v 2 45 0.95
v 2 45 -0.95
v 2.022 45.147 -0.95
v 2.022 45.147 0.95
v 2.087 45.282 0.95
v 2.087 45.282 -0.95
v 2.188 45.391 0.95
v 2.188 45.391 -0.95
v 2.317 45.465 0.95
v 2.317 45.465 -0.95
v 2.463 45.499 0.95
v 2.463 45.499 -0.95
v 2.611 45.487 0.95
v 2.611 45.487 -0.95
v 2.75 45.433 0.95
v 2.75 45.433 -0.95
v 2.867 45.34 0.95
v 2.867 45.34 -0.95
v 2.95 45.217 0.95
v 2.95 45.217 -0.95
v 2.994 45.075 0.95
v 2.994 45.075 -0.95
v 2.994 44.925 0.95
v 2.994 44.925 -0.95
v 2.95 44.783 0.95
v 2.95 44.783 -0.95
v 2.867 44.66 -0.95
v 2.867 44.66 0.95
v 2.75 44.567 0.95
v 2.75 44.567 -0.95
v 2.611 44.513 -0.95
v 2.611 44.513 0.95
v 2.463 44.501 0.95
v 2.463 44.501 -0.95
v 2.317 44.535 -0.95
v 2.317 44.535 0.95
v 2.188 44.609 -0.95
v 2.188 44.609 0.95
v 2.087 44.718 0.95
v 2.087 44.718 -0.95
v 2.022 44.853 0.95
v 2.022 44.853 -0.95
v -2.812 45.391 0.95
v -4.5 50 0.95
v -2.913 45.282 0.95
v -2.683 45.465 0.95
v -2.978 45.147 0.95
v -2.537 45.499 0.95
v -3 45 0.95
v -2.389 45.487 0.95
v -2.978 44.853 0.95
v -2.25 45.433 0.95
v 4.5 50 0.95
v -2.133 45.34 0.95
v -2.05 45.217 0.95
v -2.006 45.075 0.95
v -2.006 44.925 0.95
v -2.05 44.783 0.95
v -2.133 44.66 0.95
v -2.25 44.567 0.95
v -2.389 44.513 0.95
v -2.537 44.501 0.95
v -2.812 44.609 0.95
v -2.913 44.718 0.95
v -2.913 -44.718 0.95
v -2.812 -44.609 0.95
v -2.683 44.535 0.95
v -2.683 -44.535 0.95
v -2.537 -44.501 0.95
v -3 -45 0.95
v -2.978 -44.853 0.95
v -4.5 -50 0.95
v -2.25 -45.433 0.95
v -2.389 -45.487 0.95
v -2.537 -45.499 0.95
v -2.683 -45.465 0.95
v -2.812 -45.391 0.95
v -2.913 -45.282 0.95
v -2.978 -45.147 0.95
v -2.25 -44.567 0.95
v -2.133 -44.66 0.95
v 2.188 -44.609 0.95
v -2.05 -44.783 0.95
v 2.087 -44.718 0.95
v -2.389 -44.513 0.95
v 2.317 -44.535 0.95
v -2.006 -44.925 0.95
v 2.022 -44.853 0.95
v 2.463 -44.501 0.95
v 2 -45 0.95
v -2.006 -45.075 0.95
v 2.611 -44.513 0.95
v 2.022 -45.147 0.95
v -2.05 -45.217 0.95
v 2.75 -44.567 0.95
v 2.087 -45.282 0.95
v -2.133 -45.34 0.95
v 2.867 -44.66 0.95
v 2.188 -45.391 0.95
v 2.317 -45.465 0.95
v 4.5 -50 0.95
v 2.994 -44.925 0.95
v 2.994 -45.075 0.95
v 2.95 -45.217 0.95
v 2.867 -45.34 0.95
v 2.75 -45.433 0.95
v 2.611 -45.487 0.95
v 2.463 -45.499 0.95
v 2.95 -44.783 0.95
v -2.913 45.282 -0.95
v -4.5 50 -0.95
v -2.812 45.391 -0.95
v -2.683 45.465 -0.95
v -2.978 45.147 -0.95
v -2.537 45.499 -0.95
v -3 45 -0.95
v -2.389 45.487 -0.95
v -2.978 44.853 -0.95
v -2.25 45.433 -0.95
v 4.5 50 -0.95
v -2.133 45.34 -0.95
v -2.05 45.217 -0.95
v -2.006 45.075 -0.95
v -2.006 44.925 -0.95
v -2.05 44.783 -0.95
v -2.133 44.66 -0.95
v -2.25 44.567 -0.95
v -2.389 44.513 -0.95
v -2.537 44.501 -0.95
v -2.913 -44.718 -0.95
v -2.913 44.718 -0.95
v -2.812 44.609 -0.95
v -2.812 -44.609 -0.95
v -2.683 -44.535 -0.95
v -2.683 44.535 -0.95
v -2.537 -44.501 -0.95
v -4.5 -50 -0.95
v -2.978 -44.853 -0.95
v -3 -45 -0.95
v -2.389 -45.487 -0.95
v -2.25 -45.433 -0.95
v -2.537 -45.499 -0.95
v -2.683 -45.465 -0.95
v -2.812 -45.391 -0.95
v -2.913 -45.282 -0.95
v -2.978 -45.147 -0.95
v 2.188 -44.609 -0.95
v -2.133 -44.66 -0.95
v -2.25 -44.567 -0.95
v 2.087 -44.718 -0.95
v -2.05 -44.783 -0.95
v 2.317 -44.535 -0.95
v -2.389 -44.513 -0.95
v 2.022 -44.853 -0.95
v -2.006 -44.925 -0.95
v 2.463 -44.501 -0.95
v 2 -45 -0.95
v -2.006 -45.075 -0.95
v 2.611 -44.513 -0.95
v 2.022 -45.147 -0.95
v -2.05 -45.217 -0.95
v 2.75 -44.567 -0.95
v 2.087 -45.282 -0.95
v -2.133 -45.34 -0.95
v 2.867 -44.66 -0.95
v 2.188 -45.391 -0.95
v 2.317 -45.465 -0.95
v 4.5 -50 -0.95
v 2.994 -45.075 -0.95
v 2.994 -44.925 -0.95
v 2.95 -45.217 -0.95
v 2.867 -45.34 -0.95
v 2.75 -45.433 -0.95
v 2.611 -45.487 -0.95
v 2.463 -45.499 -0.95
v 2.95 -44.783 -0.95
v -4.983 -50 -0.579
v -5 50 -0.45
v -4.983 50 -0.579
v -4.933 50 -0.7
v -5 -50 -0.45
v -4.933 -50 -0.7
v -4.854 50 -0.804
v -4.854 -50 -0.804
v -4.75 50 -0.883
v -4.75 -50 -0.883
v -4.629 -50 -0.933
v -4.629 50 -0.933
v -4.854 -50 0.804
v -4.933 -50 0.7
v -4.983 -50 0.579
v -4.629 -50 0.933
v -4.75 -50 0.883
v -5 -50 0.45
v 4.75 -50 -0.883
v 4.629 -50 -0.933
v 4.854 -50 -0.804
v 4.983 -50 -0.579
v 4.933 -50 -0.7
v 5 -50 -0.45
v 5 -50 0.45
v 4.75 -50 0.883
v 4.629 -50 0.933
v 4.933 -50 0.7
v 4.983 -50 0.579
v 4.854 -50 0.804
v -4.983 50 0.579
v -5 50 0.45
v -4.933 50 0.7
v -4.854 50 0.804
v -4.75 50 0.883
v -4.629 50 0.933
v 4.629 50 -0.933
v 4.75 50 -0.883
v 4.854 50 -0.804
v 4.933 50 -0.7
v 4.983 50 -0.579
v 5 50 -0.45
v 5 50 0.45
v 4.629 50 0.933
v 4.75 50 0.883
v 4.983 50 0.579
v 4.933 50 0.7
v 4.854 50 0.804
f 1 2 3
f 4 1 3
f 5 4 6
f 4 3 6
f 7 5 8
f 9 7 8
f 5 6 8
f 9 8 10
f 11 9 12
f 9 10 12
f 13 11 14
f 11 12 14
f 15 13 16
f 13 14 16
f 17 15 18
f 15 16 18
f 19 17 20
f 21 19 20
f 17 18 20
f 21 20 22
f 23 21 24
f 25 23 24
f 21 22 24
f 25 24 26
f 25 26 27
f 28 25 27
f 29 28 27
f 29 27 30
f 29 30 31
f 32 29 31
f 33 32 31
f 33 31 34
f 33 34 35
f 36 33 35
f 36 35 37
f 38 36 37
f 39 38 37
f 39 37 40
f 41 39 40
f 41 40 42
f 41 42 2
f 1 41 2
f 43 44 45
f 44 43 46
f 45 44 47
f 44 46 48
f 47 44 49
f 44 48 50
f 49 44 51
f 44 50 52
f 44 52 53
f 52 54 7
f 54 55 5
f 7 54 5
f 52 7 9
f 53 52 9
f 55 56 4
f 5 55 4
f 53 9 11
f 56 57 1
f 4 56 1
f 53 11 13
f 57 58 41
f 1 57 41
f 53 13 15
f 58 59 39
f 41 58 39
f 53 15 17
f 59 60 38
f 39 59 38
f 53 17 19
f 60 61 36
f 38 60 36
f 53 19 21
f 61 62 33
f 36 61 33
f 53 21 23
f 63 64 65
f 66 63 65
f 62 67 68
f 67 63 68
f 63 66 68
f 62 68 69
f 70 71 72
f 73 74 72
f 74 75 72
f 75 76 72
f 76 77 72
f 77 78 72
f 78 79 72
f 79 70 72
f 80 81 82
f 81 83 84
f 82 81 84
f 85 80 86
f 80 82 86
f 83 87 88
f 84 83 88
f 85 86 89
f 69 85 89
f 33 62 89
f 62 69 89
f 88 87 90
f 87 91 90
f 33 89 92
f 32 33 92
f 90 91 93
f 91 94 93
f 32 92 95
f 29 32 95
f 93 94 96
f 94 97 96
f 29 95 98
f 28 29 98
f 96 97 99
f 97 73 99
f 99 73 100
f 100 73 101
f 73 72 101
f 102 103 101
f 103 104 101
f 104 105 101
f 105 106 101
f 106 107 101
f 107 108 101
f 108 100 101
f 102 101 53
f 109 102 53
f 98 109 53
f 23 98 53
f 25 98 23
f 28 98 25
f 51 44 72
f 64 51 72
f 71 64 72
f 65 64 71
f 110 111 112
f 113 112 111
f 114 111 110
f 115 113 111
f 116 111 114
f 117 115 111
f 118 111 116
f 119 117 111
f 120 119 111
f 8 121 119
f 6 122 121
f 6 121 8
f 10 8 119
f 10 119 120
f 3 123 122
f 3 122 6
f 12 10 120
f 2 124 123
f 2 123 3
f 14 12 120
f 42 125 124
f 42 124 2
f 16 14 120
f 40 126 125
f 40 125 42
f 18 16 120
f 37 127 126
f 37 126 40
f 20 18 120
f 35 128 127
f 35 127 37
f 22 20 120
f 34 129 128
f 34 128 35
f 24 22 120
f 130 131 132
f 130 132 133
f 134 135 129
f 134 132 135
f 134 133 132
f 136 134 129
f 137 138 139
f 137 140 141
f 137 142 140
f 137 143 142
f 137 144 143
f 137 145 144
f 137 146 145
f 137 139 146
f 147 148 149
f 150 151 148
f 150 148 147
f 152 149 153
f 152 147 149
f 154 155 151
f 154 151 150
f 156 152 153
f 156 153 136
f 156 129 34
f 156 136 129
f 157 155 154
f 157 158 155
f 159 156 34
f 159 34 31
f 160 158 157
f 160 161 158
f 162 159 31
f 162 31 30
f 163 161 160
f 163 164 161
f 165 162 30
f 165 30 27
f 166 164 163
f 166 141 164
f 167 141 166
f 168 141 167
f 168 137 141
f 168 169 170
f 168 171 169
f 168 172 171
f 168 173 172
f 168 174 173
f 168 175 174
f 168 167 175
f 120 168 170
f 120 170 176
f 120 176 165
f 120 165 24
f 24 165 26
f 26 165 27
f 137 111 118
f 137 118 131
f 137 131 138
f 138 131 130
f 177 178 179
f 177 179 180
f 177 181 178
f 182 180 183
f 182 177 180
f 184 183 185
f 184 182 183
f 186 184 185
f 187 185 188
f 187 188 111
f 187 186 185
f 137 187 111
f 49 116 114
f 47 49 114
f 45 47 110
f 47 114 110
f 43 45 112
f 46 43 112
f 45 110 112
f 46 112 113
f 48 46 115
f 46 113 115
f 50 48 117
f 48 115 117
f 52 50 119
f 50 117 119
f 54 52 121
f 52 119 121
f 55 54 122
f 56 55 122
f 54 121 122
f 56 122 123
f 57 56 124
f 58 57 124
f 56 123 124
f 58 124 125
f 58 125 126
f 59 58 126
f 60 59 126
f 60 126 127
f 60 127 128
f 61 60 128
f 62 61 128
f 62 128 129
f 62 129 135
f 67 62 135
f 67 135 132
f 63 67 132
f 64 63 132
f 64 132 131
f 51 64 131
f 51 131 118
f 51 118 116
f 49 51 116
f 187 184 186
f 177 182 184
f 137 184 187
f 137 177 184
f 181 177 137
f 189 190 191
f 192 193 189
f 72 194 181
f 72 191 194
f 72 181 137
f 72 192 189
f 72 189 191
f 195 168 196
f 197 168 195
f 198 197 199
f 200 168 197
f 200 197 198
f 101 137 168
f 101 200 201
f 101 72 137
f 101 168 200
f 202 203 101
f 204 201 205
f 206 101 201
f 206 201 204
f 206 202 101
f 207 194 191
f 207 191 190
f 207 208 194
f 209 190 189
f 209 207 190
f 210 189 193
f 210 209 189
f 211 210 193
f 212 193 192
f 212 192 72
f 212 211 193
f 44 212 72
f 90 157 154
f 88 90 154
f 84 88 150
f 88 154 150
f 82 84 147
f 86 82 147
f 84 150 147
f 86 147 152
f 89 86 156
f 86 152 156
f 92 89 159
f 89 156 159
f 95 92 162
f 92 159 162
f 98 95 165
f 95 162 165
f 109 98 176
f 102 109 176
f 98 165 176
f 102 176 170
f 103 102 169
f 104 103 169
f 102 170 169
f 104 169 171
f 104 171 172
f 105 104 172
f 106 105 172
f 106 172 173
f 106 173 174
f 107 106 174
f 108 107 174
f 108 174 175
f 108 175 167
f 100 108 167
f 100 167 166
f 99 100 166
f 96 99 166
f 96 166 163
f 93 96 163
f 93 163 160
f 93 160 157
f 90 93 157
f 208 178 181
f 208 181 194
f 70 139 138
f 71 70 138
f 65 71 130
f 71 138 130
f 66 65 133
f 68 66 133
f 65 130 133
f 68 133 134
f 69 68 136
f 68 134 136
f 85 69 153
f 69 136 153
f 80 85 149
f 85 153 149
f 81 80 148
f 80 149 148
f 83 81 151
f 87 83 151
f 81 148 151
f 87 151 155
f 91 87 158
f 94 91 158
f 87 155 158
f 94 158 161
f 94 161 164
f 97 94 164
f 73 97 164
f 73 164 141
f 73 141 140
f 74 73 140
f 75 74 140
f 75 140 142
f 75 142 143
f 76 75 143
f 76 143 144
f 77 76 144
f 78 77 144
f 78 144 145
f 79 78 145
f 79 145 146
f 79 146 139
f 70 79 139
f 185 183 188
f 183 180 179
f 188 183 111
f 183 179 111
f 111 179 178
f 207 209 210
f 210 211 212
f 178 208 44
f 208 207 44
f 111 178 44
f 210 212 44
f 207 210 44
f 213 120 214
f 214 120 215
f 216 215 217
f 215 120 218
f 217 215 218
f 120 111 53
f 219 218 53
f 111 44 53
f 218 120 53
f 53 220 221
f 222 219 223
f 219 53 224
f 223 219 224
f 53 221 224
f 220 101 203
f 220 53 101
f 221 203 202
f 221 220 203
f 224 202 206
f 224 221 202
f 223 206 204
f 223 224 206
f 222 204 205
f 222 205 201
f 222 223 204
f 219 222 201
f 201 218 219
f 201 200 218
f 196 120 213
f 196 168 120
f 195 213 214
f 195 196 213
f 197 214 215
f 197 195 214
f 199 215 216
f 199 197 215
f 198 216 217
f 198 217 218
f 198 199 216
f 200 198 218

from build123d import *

# Parameters (mm, degrees)
F0_W     = 10
F0_H     = 1.9
F1_DEPTH = 50
F3_D     = 1
F4_R     = 0.5


with BuildPart() as f1:
    # F0 (on Front) → F1 (new body, symmetric)
    with BuildSketch(Plane.XZ):
        Rectangle(F0_W, F0_H)
    extrude(amount=F1_DEPTH, both=True)

    # F3 (through all)
    with Locations(Plane.XY.offset(0.95)):
        with Locations((-2.5, 45), (2.5, 45), (-2.5, -45), (2.5, -45)):
            Hole(F3_D / 2)

    # F4
    f4_edges = [f1.edges().sort_by_distance(p)[0] for p in [
        (5, 0, 0.95),
        (-5, 0, 0.95),
        (5, 0, -0.95),
        (-5, 0, -0.95),
    ]]
    fillet(f4_edges, radius=F4_R)


solid = f1.part
